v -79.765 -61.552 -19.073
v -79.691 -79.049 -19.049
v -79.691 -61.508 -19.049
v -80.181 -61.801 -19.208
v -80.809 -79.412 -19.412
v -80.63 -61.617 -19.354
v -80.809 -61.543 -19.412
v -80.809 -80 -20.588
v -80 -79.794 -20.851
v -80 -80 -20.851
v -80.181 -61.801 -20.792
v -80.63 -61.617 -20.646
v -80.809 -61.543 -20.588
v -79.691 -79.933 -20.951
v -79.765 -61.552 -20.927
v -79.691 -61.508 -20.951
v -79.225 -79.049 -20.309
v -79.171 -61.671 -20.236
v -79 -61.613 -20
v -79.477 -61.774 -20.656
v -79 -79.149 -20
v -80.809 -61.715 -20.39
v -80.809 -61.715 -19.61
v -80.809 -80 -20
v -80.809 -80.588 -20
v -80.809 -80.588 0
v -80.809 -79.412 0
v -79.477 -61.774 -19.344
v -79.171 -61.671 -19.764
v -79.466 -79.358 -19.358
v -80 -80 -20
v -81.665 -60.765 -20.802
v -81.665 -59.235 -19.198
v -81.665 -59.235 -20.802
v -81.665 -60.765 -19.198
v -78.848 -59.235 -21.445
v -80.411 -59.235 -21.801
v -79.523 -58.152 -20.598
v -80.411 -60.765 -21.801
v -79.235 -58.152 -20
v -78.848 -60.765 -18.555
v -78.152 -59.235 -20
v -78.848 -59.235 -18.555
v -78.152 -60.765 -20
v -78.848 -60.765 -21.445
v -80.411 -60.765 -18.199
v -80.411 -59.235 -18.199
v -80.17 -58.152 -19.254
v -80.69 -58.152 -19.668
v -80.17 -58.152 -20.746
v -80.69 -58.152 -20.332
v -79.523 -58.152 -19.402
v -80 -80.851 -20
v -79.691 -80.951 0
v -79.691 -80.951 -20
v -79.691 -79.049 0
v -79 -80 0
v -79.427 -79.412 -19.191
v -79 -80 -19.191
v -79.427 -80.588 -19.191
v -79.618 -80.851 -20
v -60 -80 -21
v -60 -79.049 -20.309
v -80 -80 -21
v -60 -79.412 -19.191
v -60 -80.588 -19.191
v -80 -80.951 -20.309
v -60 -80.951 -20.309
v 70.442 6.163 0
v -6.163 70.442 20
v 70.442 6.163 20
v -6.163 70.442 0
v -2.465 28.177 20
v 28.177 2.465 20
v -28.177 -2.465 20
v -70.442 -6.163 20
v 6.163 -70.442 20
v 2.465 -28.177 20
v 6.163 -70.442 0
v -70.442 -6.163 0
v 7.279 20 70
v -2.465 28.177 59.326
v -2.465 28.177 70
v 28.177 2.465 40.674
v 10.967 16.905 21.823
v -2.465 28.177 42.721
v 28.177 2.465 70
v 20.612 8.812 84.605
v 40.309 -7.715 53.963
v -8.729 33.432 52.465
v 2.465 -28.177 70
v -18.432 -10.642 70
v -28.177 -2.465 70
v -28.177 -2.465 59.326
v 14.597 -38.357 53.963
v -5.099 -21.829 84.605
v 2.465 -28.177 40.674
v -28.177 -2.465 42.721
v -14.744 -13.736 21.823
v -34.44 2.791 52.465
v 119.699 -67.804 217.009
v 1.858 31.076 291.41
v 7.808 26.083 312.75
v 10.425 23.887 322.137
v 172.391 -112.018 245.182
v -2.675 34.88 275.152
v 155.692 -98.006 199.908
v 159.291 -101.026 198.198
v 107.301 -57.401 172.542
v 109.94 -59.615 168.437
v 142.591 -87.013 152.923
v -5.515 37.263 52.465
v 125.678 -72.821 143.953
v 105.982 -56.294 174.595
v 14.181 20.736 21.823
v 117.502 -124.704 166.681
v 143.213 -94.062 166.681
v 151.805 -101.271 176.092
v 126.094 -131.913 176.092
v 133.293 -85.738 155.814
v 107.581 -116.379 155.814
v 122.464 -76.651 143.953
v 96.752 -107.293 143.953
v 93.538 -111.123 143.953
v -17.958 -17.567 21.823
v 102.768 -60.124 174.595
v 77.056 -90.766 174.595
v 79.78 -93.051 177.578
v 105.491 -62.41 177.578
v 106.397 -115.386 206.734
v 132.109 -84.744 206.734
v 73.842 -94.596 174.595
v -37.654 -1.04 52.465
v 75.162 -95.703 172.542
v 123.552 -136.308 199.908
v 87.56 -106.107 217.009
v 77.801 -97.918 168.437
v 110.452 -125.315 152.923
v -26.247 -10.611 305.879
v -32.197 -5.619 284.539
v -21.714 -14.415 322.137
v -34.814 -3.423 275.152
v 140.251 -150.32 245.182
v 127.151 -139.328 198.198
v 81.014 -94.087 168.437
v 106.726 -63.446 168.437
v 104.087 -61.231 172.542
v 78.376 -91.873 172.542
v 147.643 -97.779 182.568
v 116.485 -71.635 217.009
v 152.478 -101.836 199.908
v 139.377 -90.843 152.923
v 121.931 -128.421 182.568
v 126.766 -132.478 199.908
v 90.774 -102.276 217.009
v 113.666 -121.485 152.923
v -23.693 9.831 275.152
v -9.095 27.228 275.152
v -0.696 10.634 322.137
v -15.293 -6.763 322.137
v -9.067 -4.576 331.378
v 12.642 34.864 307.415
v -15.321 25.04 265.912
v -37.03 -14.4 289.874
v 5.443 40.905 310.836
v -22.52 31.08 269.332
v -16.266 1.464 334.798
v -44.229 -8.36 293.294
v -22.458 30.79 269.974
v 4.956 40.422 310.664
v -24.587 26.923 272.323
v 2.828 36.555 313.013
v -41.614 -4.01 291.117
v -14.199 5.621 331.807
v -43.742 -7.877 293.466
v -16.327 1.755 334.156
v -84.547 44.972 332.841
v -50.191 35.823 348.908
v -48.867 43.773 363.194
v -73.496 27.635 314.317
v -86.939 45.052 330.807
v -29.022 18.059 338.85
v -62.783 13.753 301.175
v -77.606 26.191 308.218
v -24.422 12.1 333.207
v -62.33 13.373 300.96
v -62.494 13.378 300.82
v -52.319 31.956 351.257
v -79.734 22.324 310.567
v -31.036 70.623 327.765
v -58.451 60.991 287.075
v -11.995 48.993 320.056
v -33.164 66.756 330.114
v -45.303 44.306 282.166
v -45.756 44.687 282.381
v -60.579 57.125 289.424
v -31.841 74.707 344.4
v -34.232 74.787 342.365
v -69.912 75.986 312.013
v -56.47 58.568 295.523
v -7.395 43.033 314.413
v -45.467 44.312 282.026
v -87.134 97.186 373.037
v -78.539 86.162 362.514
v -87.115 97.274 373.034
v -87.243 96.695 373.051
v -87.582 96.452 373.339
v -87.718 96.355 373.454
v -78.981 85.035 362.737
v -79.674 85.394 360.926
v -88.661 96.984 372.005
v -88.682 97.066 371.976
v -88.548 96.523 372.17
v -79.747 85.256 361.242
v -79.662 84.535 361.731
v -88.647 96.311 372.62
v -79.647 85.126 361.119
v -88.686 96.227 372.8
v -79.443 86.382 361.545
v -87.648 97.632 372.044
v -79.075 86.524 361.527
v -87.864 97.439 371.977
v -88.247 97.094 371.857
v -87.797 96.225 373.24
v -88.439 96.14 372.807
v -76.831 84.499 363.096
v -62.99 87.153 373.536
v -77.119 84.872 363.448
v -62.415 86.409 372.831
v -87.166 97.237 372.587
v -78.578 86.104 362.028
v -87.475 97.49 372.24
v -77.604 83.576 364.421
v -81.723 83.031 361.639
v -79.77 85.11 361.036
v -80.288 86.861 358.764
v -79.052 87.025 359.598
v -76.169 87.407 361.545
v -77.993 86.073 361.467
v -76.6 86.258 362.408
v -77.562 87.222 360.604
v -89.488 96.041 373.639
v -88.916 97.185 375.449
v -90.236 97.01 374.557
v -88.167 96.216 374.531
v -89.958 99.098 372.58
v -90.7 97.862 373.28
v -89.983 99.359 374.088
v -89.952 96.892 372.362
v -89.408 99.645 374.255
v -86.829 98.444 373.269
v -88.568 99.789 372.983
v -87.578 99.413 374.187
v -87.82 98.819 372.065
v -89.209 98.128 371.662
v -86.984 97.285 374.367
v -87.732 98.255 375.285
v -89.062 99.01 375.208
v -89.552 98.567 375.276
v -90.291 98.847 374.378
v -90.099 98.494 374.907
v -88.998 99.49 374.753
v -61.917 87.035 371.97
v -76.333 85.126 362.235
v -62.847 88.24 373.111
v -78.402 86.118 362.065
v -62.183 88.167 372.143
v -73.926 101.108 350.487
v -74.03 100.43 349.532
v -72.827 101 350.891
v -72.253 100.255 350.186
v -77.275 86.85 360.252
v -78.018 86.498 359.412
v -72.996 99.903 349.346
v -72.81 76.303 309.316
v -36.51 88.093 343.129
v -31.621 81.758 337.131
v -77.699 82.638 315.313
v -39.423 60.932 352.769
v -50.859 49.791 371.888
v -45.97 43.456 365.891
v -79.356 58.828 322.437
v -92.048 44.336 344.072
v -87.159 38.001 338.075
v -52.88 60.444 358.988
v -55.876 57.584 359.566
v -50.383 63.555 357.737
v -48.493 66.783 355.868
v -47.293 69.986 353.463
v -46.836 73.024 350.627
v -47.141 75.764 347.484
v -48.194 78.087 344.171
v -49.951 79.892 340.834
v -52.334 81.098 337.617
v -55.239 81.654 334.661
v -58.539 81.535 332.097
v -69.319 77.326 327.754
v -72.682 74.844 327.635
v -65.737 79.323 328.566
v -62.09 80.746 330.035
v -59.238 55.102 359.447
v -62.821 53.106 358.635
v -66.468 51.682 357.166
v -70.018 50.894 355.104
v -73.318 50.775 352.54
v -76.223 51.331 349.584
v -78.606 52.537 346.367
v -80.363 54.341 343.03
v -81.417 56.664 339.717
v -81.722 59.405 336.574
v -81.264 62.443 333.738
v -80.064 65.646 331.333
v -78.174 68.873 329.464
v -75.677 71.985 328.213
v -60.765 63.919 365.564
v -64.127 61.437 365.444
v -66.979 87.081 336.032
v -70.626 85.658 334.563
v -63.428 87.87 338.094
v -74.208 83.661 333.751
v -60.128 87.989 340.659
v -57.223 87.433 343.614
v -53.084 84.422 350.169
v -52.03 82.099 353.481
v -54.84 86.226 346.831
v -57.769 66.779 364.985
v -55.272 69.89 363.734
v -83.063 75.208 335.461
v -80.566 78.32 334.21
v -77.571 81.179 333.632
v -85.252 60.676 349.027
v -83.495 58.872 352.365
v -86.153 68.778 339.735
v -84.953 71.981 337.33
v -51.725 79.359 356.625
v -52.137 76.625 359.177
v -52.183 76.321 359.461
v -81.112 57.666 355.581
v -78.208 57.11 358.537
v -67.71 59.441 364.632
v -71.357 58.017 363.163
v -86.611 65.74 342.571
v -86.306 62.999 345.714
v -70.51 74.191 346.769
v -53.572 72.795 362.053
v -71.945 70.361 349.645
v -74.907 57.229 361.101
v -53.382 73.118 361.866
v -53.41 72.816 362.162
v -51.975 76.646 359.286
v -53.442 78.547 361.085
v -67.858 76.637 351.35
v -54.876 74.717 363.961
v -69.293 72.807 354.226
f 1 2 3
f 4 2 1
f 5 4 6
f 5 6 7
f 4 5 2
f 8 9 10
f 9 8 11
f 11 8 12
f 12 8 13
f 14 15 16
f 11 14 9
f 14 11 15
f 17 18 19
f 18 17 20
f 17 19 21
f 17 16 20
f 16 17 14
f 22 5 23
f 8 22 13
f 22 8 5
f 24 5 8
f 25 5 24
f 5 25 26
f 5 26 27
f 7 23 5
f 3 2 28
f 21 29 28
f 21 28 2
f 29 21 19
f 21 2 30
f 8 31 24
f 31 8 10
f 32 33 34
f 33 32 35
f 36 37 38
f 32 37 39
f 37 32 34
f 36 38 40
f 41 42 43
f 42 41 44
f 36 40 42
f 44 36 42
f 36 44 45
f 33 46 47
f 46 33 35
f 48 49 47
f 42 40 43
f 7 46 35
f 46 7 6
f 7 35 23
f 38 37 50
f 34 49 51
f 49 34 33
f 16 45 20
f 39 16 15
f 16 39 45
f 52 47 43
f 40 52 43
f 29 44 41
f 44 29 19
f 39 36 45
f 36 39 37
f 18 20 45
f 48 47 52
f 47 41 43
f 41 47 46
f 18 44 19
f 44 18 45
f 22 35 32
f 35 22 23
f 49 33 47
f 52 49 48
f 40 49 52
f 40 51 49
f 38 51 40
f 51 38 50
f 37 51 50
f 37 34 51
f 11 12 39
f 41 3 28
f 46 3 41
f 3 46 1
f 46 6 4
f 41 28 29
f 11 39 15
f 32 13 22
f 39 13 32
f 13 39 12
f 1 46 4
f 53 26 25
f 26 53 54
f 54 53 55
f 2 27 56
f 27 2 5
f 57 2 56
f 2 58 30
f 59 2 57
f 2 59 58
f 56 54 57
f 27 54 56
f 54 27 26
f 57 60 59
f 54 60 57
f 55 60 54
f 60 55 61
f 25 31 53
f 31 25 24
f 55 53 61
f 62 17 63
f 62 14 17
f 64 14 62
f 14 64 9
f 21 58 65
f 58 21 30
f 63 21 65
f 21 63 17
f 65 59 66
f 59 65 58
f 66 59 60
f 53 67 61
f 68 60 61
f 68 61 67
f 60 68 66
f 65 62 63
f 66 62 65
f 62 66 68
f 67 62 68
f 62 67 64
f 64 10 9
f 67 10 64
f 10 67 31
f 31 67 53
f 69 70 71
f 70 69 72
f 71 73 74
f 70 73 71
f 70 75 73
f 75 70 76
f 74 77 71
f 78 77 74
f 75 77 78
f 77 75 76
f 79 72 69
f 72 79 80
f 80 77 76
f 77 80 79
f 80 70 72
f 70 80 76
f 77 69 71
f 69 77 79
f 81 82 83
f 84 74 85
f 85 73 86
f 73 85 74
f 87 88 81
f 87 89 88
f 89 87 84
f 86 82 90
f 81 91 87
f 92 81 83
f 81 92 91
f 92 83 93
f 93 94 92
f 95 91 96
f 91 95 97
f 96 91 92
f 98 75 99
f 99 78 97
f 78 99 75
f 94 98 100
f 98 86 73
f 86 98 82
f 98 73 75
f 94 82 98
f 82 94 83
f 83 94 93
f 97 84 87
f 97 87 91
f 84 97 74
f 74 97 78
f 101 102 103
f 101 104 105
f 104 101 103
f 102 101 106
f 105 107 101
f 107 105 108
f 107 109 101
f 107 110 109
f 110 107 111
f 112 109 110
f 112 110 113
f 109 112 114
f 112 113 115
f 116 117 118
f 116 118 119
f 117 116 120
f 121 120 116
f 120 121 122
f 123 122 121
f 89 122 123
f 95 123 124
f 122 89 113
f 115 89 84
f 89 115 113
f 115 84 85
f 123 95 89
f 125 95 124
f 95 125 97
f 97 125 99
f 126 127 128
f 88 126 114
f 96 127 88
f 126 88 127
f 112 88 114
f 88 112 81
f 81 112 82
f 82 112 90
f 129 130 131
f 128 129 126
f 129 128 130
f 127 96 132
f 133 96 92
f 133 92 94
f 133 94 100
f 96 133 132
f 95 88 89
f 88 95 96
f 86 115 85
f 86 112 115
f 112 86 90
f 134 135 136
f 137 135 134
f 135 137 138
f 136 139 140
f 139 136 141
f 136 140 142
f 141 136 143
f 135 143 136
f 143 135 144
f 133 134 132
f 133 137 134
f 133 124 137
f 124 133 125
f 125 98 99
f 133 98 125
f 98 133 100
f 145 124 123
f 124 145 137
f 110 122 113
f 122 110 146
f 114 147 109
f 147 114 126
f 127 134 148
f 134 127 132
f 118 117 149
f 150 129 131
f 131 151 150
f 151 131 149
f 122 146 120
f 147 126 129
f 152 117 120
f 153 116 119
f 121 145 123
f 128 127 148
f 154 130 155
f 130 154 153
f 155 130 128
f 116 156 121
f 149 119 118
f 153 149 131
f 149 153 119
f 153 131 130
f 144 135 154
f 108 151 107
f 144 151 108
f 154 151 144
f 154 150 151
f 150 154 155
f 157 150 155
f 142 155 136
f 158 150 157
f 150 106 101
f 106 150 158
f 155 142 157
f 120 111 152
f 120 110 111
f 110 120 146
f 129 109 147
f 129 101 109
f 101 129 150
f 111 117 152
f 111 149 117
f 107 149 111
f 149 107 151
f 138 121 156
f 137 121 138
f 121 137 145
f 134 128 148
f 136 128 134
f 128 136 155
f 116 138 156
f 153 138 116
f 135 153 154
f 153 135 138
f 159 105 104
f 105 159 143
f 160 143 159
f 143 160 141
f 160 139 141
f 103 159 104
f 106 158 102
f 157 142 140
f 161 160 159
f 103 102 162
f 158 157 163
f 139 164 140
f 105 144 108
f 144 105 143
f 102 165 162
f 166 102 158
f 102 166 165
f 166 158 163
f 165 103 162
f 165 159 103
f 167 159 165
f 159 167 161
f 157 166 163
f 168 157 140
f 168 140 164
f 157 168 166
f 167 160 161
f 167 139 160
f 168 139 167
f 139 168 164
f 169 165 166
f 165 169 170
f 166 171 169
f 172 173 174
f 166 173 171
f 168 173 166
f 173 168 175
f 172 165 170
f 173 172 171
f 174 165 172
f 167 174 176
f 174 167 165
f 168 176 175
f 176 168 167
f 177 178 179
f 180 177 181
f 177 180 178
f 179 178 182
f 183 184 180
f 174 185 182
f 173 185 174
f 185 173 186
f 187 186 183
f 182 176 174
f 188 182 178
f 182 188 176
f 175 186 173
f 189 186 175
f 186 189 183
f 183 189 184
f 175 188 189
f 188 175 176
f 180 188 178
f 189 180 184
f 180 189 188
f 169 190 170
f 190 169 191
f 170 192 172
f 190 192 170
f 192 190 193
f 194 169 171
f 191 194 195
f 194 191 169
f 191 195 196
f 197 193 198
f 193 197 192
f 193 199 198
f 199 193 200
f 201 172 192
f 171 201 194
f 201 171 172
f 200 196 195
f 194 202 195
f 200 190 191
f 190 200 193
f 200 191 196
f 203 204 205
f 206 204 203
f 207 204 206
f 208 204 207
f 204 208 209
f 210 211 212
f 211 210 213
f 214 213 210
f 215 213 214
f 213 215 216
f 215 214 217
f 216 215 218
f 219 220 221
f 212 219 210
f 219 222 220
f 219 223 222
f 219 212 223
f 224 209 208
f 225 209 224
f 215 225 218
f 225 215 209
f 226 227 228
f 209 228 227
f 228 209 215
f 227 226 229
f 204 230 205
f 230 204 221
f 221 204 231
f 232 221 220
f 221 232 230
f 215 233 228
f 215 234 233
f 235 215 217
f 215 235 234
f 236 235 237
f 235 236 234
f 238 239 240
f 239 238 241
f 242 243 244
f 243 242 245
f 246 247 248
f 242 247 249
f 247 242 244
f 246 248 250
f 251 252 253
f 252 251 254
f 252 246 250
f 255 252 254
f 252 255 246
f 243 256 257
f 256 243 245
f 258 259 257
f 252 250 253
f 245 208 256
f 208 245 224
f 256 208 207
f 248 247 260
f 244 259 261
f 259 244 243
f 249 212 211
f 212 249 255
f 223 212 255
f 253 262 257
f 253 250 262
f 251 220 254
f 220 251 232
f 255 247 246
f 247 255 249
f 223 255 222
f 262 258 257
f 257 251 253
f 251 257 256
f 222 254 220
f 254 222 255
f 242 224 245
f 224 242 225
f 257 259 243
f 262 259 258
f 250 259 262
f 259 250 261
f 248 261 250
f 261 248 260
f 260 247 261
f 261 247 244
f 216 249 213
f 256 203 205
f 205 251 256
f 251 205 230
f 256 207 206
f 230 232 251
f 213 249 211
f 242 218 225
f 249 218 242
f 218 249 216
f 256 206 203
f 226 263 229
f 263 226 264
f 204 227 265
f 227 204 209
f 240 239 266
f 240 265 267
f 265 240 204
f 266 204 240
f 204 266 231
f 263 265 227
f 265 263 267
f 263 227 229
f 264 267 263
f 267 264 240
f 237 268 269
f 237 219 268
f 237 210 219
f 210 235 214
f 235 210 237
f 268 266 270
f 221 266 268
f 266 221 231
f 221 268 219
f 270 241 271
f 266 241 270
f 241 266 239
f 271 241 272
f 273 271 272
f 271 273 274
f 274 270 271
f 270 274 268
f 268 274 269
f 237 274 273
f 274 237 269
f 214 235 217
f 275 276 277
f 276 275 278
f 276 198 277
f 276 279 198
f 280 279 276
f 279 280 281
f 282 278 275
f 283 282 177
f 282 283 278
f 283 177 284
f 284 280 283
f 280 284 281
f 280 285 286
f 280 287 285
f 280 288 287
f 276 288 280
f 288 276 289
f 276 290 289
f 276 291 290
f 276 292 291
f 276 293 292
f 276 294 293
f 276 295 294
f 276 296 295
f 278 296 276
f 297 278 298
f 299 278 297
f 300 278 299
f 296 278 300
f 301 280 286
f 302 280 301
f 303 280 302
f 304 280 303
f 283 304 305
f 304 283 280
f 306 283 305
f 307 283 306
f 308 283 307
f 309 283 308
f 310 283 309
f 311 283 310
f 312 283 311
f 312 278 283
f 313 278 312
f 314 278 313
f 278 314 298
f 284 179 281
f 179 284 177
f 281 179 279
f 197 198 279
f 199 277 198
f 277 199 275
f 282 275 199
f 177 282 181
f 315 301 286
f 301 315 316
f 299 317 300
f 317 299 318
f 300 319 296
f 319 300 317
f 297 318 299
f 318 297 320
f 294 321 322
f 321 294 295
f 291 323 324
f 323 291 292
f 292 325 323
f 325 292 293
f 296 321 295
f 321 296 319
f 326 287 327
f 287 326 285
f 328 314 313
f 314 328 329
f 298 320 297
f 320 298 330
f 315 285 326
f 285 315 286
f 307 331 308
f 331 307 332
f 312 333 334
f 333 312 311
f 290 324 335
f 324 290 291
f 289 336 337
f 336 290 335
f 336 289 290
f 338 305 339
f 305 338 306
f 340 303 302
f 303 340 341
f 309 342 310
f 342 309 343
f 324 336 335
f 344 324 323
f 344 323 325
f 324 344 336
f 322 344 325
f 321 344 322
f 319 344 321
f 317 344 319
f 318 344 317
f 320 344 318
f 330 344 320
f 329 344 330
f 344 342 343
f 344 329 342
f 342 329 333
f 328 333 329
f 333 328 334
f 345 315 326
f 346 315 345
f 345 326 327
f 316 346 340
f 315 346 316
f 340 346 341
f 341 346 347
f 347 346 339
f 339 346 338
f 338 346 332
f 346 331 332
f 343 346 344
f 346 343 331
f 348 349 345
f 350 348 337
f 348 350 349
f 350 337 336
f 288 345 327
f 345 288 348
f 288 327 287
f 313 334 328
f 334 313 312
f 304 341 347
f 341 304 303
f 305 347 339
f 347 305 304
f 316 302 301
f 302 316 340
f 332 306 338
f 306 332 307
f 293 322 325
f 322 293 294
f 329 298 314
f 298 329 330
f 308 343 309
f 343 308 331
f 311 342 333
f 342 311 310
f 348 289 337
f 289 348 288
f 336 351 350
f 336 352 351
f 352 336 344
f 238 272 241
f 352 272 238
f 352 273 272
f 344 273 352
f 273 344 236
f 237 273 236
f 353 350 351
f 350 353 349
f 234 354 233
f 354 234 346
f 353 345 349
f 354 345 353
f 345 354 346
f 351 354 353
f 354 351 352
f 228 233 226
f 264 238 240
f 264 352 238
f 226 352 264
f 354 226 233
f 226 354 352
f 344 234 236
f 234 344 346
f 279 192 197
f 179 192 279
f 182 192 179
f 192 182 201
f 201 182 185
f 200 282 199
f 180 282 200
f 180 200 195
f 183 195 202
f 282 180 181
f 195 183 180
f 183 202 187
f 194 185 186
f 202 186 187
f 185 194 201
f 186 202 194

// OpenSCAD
function rotX(ang,obj)=
    let (mat = [
        [1,0       ,0        ],
        [0,cos(ang),-sin(ang)],
        [0,sin(ang),cos(ang) ]
    ])
    mat*obj;

function rotY(ang,obj)=
    let (mat = [
        [cos(ang) ,0 ,sin(ang)],
        [0        ,1 ,0       ],
        [-sin(ang),0 ,cos(ang)]
    ])
    mat*obj;

function rotX(ang,obj)=

    let (mat = [
        [cos(ang),-sin(ang),0],
        [sin(ang),cos(ang),0 ],
        [0       ,0       ,1 ]
    ])
    mat*obj;

axis([-80,-80,-20],[0,0,0]);

function zrot(ang) = [
        [cos(ang),-sin(ang),0],
        [sin(ang),cos(ang),0 ],
        [0       ,0       ,1 ]
];
function yrot(ang) = [
        [cos(ang) ,0 ,sin(ang)],
        [0        ,1 ,0       ],
        [-sin(ang),0 ,cos(ang)]
];
function xrot(ang) = [
        [1,0       ,0        ],
        [0,cos(ang),-sin(ang)],
        [0,sin(ang),cos(ang) ]
];

module axis(position,rotation){
   translate(position) rotate(rotation){
   color("blue") rotate([0,0,0]) cylinder(20,1,1);
   color("red") rotate([-90,0,0]) {cylinder(20,1,1); translate([0,0,20]) sphere(2);};
   color("green") rotate([0,90,0]) cylinder(20,1,1);
   };
};
module axis_1(){
        translate([0,0,10])cube([100,100,20],center = true);
        translate([0,0,45])cube([40,40,50],center = true);
};
module axis_2(){
        union(){
        translate([22.5,5,0])cube([5,50,40],center = true);
        translate([-22.5,5,0])cube([5,50,40],center = true);
        translate([0,100,0])cube([50,140,40],center = true);
        translate([0,195,0])cube([40,50,40],center = true);
        };
};
module axis_3(){
    union(){
    translate([22.5,5,5])cube([5,50,50],center = true);
    translate([-22.5,5,5])cube([5,50,50],center = true);
    translate([0,87.5,55])cube([50,225,50],center = true);
    };
};
module axis_4(){
    union(){
    translate([0,5,0]) cube([51,10,51],center=true);
    translate([-22.5,35,0]) cube([5,50,50],center = true);
    translate([22.5,35,0]) cube([5,50,50],center = true);
    };
};
module axis_5(){
    translate([0,20,0])cube([40,50,50],center = true);
};
module axis_6(){
    translate([0,5,0]) cube([50,10,50],center = true);
    translate([0,10,0]) rotate([-90,0,0]) cylinder(10,20,20);
    translate([-2.5,20,0]) cube([5,3,20]);
    translate([0,30,0]) cube([5,20,5],center = true);
    translate([0,40,0]) axis([0,0,0],[0,0,0]);
};

Base_size = [150,150,10];
A1_position = [0,0,50];
A2_position = [0,200,0];
A3_position = [0,200,55];
A4_position = [0,35,0];
A5_position = [0,45,0];
A6_position = [0,40,0];


A1_limit = [0,360];
A2_limit = [0,180];
A3_limit = [0,180];
A4_limit = [0,369];
A5_limit = [0,180];
A6_limit = [0,360];

A1_current = 50;
A2_current = 140;
A3_current = 120;
A4_current = 30;
A5_current = 70;
A6_current = 10;

initial_position = [0,0,0];
target_position = [150,150,150];
target_rotation = [0,0,0];

target_x = target_position[0];
target_y = target_position[1];
target_z = target_position[2];
target_xrot = target_rotation[0];
target_yrot = target_rotation[1];
target_zrot = target_rotation[2];


module target(position,rotation){
    axis(position,rotation);
};

rotate([0,0,A1_current]){axis_1(); 
translate(A1_position) rotate([A2_current,0,0]){axis_2();
translate(A2_position) rotate([-A3_current,0,0]){axis_3();
translate(A3_position) rotate([0,A4_current,0]){axis_4();
translate(A4_position) rotate([-(A5_current-90),0,0]){axis_5();
translate(A5_position) rotate([0,A6_current,0]){axis_6();
};
};
};  
};
};
};

end_pos =   zrot(A1_current)*(A1_position+
            xrot(A2_current)*(A2_position+
            xrot(-A3_current)*(A3_position+
            yrot(A4_current)*(A4_position+
            xrot(-(A5_current-90))*(A5_position+
            yrot(A6_current)*(A6_position)
)))));

end_rot =   zrot(A1_current)*
            xrot(A2_current)*
            xrot(-A3_current)*
            yrot(A4_current)*
            xrot(-(A5_current-90))*
            yrot(A6_current)*
            [[1,0,0],
             [0,1,0],
             [0,0,1]];


echo(end_pos);
echo(end_rot[0],"\n   ",end_rot[1],"\n   ",end_rot[2]);
/*
target(target_position,target_rotation);

i = end_rot[2][2];
g = end_rot[2][0];
d = end_rot[1][0];

alpha = asin(-g);
beta = acos(i/(cos(alpha)));
gamma = asin((d/i)*alpha);

rot_abs = [alpha,beta,gamma];

axis(end_pos+[10,10,10],rot_abs);
*/

mat = [
        [1,2,3],
        [4,5,6],
        [7,8,9]
];
echo(mat[0][0]);
